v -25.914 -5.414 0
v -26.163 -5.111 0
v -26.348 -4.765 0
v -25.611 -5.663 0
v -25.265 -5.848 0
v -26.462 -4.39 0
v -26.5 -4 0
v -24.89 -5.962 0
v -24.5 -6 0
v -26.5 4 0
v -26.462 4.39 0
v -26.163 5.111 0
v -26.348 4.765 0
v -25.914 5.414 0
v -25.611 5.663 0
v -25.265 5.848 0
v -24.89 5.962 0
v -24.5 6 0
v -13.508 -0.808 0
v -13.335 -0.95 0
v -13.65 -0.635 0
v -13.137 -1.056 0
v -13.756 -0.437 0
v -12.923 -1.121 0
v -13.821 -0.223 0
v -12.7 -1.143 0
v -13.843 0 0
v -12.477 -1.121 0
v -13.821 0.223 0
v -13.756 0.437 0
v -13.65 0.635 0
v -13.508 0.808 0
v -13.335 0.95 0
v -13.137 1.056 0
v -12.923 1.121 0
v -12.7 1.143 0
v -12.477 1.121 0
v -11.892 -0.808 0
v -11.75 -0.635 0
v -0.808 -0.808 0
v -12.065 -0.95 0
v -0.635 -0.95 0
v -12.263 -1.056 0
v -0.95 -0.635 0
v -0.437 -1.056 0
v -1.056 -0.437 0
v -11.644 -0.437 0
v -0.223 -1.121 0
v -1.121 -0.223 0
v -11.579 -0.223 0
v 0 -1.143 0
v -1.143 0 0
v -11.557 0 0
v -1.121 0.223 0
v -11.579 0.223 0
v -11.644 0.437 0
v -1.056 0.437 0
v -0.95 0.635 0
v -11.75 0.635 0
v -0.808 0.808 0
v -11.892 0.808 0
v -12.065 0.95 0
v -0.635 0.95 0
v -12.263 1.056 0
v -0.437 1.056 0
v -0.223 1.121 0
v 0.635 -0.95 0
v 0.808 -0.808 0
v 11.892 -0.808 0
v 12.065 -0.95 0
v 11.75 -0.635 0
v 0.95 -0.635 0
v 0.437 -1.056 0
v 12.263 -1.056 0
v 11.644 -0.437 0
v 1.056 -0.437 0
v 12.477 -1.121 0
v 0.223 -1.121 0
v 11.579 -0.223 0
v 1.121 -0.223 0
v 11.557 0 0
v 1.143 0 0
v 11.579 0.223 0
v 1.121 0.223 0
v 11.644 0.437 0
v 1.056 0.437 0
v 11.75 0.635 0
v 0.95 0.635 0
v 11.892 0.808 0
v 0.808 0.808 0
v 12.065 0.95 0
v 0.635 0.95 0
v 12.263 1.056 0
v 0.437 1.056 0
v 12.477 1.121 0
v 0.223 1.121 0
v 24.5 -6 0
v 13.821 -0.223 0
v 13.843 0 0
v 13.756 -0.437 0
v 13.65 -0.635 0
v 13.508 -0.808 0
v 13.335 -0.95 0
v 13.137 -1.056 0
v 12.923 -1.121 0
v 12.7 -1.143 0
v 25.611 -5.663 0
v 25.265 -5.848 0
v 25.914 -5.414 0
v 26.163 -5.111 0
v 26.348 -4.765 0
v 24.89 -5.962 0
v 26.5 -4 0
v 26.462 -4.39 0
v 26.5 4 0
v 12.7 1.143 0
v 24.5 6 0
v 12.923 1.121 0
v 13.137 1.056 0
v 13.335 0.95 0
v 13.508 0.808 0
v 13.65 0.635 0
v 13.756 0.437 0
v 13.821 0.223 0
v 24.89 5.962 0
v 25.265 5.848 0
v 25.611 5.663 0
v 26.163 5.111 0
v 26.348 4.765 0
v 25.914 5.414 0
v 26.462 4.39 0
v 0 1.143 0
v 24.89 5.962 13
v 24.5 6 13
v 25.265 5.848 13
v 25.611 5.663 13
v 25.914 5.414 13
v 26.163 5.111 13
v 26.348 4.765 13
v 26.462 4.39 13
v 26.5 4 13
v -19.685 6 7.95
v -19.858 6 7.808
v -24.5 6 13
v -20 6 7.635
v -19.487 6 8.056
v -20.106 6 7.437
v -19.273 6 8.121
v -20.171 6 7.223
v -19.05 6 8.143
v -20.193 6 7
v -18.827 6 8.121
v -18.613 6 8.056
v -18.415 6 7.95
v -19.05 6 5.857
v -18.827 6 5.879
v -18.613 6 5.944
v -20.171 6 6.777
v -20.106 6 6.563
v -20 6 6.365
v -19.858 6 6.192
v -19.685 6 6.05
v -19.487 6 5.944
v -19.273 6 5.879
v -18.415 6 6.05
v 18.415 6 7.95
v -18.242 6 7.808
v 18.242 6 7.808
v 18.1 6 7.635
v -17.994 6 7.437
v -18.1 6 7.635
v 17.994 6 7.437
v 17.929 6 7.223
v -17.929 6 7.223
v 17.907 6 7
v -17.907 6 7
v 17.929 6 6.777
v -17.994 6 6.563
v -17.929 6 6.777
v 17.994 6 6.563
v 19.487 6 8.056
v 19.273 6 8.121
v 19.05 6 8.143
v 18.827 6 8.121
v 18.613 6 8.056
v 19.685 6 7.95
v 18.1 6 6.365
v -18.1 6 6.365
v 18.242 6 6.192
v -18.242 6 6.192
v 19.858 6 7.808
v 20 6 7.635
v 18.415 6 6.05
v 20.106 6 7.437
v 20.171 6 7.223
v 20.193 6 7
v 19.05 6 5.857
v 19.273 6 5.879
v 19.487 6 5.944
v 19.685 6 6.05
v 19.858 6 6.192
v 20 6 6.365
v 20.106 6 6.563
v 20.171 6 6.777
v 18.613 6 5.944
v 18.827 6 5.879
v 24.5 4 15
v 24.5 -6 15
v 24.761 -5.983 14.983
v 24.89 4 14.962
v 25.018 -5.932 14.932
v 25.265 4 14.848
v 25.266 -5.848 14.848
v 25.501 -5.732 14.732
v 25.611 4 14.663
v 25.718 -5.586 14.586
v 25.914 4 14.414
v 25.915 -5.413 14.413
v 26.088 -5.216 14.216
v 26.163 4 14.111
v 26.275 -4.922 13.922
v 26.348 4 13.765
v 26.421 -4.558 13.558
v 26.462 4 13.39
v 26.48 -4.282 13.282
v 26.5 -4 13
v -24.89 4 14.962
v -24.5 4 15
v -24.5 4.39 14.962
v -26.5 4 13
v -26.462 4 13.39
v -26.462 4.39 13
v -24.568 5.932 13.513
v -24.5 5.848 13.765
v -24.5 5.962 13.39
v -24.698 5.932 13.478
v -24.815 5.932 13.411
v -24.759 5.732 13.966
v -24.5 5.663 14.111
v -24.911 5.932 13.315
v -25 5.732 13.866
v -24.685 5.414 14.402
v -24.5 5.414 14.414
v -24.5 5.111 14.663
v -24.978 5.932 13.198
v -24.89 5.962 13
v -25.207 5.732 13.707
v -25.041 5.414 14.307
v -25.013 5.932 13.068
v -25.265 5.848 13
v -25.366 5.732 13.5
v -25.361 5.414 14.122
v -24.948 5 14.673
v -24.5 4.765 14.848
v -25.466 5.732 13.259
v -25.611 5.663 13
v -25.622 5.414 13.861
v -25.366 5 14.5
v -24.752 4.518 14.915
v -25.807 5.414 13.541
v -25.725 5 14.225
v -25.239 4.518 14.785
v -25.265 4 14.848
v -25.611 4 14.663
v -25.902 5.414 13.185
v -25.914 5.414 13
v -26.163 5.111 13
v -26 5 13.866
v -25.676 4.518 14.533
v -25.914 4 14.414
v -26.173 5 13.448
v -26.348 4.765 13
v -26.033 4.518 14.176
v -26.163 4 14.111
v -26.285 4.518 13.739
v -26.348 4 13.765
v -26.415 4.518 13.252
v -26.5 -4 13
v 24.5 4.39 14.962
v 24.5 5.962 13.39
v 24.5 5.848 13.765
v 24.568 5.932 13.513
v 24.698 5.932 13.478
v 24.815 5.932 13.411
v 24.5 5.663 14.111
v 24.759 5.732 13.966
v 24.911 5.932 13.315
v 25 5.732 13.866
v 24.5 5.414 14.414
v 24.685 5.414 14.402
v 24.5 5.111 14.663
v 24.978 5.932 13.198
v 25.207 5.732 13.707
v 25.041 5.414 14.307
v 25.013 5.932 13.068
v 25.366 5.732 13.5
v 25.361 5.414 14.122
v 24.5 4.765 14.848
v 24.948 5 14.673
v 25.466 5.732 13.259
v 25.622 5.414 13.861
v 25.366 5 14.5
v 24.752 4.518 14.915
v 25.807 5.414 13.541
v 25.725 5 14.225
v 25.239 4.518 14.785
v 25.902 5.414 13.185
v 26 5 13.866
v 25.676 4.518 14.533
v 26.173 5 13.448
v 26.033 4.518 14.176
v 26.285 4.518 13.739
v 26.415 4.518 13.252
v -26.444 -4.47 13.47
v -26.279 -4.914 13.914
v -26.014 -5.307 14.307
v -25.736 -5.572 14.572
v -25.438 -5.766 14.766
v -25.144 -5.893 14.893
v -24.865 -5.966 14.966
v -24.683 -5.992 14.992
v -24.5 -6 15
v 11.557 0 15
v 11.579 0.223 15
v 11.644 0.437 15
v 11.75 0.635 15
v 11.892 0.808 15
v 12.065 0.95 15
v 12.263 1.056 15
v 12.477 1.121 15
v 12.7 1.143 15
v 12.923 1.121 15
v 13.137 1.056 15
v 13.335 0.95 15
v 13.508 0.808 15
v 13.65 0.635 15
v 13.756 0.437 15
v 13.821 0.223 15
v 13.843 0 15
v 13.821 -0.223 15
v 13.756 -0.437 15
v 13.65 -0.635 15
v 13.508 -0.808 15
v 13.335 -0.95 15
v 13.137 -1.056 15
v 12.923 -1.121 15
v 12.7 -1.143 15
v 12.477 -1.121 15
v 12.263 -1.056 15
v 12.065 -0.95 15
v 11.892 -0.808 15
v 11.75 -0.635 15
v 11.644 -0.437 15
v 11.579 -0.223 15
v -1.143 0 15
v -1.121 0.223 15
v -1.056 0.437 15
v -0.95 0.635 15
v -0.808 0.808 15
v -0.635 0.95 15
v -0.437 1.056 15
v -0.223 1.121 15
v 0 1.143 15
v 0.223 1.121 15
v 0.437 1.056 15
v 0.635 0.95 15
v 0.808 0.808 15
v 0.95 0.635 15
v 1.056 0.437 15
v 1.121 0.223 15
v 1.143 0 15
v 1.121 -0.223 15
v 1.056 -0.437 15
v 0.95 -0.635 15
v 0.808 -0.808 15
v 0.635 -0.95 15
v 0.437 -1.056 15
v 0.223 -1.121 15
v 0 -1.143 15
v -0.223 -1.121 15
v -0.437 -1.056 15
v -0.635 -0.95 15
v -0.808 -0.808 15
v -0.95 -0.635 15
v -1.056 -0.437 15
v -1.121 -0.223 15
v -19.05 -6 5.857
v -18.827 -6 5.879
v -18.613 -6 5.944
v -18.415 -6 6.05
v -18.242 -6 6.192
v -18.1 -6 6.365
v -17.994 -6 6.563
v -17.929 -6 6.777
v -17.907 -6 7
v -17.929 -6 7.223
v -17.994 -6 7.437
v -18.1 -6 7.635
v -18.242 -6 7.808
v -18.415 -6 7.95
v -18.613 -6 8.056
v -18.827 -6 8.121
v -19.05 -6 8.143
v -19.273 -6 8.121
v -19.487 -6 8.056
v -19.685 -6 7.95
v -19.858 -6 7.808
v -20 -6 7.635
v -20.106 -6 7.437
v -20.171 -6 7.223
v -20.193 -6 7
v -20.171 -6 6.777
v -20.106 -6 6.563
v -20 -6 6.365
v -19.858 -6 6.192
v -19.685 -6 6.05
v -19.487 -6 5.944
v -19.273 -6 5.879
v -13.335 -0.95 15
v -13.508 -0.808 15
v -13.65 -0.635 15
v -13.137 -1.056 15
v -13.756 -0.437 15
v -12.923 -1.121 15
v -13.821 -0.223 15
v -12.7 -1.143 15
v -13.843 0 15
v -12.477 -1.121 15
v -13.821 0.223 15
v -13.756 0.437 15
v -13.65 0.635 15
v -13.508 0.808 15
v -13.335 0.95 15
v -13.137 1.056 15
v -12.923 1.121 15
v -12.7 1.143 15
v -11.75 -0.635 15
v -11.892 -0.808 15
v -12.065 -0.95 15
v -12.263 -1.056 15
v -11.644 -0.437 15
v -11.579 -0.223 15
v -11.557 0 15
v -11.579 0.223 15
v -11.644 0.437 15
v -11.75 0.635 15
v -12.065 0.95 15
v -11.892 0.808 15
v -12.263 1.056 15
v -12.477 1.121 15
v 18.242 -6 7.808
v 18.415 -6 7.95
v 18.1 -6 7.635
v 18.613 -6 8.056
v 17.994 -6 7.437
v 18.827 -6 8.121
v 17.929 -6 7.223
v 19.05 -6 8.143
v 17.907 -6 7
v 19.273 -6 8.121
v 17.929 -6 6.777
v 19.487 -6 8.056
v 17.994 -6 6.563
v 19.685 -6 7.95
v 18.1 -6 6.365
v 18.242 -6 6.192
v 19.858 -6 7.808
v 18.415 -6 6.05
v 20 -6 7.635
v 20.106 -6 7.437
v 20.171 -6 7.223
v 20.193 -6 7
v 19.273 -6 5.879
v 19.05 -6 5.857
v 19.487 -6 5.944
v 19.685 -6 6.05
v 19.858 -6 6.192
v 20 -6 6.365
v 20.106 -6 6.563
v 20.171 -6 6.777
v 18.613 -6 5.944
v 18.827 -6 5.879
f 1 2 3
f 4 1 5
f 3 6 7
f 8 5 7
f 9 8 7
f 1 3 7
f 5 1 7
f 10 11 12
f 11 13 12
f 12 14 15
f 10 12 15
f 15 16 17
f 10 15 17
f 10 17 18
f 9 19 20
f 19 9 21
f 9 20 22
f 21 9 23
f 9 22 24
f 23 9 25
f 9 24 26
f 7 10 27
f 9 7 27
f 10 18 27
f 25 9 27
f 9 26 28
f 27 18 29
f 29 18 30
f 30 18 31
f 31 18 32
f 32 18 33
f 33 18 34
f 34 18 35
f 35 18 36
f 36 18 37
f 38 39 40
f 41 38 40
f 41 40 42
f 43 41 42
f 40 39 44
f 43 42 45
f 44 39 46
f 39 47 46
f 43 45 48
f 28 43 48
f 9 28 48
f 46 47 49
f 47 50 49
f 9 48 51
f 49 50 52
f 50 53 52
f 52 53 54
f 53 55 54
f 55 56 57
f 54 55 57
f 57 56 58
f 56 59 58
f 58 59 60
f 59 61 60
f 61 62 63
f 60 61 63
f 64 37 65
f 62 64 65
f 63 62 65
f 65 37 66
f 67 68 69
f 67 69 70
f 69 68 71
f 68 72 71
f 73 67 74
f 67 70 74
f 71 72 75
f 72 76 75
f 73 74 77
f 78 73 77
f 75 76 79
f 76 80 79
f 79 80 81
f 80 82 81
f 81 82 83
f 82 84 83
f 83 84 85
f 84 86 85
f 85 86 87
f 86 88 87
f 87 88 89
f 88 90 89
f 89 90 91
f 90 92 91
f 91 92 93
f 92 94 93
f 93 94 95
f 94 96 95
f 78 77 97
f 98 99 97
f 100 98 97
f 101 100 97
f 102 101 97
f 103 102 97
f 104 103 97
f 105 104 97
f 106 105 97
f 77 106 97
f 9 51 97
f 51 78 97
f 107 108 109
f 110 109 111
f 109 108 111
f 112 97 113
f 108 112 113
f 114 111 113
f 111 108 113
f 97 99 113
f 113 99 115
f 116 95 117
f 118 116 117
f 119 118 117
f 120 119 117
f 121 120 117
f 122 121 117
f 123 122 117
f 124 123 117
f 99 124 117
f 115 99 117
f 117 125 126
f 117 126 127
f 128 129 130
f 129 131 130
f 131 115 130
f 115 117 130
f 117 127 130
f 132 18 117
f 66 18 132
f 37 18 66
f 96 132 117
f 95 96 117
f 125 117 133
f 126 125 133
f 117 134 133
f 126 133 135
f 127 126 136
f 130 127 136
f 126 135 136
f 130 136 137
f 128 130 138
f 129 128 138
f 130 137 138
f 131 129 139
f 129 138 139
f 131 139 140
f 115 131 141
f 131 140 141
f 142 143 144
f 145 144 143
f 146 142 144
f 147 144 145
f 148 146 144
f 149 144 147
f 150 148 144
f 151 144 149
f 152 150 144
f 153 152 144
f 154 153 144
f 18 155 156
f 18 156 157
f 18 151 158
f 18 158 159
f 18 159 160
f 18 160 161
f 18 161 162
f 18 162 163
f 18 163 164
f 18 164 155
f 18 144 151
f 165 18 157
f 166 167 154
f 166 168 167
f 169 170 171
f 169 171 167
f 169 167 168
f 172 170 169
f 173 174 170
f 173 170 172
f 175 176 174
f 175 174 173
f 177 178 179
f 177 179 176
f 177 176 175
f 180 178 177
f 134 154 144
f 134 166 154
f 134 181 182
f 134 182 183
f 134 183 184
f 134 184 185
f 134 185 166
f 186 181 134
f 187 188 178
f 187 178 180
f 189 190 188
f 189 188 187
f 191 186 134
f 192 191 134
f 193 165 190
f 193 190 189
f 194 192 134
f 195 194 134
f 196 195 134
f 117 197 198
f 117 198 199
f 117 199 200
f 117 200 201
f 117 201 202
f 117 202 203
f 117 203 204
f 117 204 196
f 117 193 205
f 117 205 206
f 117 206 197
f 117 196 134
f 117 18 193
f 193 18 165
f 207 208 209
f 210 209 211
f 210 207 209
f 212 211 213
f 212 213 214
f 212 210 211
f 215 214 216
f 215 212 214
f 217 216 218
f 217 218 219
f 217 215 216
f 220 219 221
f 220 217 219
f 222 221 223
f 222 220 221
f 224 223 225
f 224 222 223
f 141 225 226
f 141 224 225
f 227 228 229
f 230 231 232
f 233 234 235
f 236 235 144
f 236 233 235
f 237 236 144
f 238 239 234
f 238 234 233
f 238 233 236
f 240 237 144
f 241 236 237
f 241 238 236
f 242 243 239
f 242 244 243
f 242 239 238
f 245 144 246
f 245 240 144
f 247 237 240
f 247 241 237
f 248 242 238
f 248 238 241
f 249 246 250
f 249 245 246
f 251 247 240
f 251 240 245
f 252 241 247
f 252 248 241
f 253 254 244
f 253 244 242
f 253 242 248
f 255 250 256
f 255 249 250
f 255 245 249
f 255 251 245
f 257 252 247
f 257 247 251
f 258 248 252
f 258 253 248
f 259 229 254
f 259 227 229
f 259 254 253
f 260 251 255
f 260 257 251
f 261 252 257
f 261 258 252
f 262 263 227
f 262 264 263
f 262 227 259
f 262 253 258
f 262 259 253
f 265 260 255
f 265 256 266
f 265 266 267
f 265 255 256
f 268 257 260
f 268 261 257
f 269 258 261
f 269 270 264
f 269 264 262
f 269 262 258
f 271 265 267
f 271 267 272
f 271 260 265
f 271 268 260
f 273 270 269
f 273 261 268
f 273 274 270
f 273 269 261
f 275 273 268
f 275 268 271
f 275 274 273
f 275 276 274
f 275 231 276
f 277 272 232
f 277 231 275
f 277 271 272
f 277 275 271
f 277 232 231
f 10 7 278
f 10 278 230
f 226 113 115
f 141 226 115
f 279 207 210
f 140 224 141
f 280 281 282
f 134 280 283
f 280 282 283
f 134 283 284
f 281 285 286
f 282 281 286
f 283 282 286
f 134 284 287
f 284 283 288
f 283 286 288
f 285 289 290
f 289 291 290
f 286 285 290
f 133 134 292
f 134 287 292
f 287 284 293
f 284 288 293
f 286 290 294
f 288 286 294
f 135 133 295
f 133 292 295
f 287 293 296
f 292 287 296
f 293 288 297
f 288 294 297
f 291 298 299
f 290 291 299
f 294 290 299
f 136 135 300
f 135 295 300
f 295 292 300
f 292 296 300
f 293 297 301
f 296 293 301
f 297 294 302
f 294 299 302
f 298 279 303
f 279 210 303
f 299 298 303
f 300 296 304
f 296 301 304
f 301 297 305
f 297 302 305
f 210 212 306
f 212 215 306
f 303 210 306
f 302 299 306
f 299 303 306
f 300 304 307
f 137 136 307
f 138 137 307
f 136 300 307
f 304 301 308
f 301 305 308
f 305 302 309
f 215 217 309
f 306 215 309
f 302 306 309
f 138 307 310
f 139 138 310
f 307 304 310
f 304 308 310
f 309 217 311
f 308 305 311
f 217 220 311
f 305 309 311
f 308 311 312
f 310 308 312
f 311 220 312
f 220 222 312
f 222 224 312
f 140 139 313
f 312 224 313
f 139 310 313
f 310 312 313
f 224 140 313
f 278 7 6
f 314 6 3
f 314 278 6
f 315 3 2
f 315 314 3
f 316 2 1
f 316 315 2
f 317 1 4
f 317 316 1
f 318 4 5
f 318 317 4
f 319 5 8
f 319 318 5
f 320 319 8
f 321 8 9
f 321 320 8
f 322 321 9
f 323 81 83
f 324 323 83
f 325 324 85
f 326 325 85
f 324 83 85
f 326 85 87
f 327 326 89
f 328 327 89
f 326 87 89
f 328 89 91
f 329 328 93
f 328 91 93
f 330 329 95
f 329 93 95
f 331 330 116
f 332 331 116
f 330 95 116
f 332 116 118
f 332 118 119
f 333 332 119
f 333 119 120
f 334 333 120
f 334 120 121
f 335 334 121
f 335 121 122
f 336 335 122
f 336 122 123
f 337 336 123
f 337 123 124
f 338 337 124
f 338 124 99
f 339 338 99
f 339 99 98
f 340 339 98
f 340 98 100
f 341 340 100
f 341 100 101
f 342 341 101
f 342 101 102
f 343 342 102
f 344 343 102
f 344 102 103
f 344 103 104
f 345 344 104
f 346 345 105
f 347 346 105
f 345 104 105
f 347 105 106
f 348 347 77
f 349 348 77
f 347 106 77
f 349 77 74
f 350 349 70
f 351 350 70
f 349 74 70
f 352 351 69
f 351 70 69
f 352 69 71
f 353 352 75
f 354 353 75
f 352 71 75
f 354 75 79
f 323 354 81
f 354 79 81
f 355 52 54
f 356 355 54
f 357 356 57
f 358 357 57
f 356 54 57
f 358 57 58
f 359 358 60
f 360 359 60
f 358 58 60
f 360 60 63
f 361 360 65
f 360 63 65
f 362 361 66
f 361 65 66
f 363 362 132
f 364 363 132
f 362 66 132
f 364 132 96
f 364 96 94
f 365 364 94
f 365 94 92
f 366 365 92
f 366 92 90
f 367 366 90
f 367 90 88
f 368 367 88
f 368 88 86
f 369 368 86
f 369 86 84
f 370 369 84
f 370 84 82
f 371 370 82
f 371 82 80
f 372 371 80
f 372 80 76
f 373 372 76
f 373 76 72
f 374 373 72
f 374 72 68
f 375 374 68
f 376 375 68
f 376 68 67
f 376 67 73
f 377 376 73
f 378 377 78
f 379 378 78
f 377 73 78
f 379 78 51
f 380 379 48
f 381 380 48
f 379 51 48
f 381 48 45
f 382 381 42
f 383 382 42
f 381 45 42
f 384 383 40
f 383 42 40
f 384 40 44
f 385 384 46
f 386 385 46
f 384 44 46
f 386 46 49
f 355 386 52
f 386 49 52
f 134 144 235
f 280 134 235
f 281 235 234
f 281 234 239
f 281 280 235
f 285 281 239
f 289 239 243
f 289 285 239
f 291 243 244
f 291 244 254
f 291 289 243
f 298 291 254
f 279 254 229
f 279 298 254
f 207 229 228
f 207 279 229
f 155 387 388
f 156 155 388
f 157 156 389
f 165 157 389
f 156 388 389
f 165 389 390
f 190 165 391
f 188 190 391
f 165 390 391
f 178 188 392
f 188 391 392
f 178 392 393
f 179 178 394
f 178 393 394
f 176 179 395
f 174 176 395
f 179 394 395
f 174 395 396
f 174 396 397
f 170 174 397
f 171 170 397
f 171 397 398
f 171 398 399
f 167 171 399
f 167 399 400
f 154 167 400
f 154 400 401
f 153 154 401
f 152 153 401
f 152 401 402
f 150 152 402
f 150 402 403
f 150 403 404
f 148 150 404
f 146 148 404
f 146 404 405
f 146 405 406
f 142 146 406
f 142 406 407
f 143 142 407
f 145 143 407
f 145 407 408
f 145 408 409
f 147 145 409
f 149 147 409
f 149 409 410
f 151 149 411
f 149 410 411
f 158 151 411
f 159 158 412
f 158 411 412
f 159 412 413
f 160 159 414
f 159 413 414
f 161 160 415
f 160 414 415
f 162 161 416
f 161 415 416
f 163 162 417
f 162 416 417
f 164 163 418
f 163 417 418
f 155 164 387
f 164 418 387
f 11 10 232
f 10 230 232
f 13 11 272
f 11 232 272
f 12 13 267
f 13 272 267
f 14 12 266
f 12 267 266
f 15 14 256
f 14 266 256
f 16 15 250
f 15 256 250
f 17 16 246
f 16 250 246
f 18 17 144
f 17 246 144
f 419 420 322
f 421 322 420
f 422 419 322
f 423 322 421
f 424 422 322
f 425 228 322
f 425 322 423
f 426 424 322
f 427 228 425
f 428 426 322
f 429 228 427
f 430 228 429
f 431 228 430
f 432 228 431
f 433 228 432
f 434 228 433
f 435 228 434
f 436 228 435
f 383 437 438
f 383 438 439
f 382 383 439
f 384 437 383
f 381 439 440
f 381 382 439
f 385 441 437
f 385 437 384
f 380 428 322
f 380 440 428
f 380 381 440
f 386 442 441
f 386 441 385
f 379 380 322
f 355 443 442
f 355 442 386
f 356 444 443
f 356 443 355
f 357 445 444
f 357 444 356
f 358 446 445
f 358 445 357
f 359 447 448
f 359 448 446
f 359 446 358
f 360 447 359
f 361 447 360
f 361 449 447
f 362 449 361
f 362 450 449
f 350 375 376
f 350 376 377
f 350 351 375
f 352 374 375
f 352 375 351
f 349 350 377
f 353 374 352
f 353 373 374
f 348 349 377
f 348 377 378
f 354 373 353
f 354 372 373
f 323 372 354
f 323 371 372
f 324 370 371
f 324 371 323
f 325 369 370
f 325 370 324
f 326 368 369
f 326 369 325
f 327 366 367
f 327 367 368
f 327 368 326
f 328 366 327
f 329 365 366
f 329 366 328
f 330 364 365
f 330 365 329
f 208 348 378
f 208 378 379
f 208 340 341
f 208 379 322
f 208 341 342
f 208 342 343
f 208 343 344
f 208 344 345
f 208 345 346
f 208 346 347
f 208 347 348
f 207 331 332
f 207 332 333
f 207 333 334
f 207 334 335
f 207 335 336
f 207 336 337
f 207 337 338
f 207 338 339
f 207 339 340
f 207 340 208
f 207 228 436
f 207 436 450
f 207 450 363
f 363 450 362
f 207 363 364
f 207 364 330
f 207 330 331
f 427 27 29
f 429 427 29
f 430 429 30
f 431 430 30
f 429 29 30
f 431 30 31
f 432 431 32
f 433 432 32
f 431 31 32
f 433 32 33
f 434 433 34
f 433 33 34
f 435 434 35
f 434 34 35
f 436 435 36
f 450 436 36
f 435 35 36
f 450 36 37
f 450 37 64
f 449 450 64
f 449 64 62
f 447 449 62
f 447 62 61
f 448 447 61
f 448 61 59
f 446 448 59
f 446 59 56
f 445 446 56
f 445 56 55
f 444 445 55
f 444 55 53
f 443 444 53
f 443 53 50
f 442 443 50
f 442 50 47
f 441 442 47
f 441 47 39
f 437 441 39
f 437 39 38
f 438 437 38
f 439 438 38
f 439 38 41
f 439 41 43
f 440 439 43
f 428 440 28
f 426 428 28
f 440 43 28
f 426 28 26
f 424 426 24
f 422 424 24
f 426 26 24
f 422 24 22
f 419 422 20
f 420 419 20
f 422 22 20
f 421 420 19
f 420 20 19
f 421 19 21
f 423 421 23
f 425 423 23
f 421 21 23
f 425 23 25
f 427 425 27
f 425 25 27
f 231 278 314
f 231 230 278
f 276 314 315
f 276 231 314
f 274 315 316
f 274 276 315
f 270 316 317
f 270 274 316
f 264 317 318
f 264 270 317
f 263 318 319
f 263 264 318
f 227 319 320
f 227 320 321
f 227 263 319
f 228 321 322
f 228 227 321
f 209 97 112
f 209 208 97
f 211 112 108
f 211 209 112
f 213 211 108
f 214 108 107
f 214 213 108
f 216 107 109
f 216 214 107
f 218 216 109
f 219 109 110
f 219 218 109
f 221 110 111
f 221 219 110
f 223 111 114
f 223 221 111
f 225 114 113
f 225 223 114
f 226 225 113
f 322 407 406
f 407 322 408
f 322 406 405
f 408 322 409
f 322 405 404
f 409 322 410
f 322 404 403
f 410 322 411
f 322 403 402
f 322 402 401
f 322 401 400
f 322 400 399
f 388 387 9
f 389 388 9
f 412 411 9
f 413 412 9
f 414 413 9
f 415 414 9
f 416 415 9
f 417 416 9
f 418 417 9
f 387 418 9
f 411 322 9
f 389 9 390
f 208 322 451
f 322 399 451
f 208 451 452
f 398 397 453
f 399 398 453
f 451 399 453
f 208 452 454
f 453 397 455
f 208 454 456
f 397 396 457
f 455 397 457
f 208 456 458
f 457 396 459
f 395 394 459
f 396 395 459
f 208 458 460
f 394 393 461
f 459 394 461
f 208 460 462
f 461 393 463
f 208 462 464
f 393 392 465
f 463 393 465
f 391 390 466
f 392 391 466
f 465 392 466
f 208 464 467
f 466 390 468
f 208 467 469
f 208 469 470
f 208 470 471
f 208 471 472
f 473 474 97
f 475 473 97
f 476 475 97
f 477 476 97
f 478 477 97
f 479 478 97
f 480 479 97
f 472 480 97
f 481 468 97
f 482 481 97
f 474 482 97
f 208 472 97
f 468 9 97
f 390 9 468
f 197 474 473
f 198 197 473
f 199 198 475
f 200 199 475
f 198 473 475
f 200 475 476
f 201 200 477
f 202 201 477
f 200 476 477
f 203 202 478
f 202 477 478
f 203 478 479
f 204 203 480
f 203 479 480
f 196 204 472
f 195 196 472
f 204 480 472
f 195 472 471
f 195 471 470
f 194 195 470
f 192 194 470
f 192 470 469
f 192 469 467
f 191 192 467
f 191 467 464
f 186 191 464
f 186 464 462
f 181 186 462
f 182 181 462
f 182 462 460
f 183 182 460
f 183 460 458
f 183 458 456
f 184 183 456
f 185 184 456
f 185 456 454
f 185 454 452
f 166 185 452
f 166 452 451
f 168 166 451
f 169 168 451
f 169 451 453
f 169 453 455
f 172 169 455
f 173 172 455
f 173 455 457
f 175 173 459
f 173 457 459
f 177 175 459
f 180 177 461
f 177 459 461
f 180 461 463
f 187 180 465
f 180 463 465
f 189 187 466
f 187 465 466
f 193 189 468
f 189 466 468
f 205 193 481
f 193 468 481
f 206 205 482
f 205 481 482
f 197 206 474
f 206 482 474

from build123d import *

# Parameters (mm, degrees)
SKETCH1_W           = 53
SKETCH1_H           = 12
BOSS_EXTRUDE1_DEPTH = 15
CUT_EXTRUDE1_REACH  = 34.73
SKETCH2_R           = 1.143
FILLET1_R           = 2
SKETCH3_R           = 1.143
CUT_EXTRUDE2_DEPTH  = 32.036269106


with BuildPart() as part:
    # Sketch1 → Boss-Extrude1 (new body)
    with BuildSketch(Plane.XY):
        Rectangle(SKETCH1_W, SKETCH1_H)
    extrude(amount=BOSS_EXTRUDE1_DEPTH)

    # Sketch2 → Cut-Extrude1 (cut, up to next)
    with BuildSketch(Plane.XZ.offset(6), mode=Mode.PRIVATE) as cut_extrude1_sk1:
        with Locations(Location((-19.05, 7, 0), (0, 0, 270))):
            Circle(SKETCH2_R)
    cut_extrude1_tool1 = extrude(cut_extrude1_sk1.sketch, amount=-CUT_EXTRUDE1_REACH, mode=Mode.PRIVATE) & part.part
    # Sketch2 → Cut-Extrude1 (cut, up to next)
    with BuildSketch(Plane.XZ.offset(6), mode=Mode.PRIVATE) as cut_extrude1_sk2:
        with Locations(Location((19.05, 7, 0), (0, 0, 270))):
            Circle(SKETCH2_R)
    cut_extrude1_tool2 = extrude(cut_extrude1_sk2.sketch, amount=-CUT_EXTRUDE1_REACH, mode=Mode.PRIVATE) & part.part
    add(cut_extrude1_tool1.solids().sort_by_distance((-19.05, -6, 7))[0], mode=Mode.SUBTRACT)
    add(cut_extrude1_tool2.solids().sort_by_distance((19.05, -6, 7))[0], mode=Mode.SUBTRACT)

    # Fillet1
    fillet1_edges = [part.edges().sort_by_distance(p)[0] for p in [
        (-26.5, 0, 15),
        (26.5, 0, 15),
        (0, 6, 15),
        (26.5, -6, 7.5),
        (-26.5, -6, 7.5),
        (-26.5, 6, 7.5),
        (26.5, 6, 7.5),
    ]]
    fillet(fillet1_edges, radius=FILLET1_R)

    # Sketch3 → Cut-Extrude2 (cut, through all)
    with BuildSketch(Plane(origin=(0, 0, 0), x_dir=(-1, 0, 0), z_dir=(0, 0, -1))):
        with Locations((-12.7, 0)):
            Circle(SKETCH3_R)
        with Locations((12.7, 0)):
            Circle(SKETCH3_R)
        Circle(SKETCH3_R)
    extrude(amount=-CUT_EXTRUDE2_DEPTH, mode=Mode.SUBTRACT)


solid = part.part
